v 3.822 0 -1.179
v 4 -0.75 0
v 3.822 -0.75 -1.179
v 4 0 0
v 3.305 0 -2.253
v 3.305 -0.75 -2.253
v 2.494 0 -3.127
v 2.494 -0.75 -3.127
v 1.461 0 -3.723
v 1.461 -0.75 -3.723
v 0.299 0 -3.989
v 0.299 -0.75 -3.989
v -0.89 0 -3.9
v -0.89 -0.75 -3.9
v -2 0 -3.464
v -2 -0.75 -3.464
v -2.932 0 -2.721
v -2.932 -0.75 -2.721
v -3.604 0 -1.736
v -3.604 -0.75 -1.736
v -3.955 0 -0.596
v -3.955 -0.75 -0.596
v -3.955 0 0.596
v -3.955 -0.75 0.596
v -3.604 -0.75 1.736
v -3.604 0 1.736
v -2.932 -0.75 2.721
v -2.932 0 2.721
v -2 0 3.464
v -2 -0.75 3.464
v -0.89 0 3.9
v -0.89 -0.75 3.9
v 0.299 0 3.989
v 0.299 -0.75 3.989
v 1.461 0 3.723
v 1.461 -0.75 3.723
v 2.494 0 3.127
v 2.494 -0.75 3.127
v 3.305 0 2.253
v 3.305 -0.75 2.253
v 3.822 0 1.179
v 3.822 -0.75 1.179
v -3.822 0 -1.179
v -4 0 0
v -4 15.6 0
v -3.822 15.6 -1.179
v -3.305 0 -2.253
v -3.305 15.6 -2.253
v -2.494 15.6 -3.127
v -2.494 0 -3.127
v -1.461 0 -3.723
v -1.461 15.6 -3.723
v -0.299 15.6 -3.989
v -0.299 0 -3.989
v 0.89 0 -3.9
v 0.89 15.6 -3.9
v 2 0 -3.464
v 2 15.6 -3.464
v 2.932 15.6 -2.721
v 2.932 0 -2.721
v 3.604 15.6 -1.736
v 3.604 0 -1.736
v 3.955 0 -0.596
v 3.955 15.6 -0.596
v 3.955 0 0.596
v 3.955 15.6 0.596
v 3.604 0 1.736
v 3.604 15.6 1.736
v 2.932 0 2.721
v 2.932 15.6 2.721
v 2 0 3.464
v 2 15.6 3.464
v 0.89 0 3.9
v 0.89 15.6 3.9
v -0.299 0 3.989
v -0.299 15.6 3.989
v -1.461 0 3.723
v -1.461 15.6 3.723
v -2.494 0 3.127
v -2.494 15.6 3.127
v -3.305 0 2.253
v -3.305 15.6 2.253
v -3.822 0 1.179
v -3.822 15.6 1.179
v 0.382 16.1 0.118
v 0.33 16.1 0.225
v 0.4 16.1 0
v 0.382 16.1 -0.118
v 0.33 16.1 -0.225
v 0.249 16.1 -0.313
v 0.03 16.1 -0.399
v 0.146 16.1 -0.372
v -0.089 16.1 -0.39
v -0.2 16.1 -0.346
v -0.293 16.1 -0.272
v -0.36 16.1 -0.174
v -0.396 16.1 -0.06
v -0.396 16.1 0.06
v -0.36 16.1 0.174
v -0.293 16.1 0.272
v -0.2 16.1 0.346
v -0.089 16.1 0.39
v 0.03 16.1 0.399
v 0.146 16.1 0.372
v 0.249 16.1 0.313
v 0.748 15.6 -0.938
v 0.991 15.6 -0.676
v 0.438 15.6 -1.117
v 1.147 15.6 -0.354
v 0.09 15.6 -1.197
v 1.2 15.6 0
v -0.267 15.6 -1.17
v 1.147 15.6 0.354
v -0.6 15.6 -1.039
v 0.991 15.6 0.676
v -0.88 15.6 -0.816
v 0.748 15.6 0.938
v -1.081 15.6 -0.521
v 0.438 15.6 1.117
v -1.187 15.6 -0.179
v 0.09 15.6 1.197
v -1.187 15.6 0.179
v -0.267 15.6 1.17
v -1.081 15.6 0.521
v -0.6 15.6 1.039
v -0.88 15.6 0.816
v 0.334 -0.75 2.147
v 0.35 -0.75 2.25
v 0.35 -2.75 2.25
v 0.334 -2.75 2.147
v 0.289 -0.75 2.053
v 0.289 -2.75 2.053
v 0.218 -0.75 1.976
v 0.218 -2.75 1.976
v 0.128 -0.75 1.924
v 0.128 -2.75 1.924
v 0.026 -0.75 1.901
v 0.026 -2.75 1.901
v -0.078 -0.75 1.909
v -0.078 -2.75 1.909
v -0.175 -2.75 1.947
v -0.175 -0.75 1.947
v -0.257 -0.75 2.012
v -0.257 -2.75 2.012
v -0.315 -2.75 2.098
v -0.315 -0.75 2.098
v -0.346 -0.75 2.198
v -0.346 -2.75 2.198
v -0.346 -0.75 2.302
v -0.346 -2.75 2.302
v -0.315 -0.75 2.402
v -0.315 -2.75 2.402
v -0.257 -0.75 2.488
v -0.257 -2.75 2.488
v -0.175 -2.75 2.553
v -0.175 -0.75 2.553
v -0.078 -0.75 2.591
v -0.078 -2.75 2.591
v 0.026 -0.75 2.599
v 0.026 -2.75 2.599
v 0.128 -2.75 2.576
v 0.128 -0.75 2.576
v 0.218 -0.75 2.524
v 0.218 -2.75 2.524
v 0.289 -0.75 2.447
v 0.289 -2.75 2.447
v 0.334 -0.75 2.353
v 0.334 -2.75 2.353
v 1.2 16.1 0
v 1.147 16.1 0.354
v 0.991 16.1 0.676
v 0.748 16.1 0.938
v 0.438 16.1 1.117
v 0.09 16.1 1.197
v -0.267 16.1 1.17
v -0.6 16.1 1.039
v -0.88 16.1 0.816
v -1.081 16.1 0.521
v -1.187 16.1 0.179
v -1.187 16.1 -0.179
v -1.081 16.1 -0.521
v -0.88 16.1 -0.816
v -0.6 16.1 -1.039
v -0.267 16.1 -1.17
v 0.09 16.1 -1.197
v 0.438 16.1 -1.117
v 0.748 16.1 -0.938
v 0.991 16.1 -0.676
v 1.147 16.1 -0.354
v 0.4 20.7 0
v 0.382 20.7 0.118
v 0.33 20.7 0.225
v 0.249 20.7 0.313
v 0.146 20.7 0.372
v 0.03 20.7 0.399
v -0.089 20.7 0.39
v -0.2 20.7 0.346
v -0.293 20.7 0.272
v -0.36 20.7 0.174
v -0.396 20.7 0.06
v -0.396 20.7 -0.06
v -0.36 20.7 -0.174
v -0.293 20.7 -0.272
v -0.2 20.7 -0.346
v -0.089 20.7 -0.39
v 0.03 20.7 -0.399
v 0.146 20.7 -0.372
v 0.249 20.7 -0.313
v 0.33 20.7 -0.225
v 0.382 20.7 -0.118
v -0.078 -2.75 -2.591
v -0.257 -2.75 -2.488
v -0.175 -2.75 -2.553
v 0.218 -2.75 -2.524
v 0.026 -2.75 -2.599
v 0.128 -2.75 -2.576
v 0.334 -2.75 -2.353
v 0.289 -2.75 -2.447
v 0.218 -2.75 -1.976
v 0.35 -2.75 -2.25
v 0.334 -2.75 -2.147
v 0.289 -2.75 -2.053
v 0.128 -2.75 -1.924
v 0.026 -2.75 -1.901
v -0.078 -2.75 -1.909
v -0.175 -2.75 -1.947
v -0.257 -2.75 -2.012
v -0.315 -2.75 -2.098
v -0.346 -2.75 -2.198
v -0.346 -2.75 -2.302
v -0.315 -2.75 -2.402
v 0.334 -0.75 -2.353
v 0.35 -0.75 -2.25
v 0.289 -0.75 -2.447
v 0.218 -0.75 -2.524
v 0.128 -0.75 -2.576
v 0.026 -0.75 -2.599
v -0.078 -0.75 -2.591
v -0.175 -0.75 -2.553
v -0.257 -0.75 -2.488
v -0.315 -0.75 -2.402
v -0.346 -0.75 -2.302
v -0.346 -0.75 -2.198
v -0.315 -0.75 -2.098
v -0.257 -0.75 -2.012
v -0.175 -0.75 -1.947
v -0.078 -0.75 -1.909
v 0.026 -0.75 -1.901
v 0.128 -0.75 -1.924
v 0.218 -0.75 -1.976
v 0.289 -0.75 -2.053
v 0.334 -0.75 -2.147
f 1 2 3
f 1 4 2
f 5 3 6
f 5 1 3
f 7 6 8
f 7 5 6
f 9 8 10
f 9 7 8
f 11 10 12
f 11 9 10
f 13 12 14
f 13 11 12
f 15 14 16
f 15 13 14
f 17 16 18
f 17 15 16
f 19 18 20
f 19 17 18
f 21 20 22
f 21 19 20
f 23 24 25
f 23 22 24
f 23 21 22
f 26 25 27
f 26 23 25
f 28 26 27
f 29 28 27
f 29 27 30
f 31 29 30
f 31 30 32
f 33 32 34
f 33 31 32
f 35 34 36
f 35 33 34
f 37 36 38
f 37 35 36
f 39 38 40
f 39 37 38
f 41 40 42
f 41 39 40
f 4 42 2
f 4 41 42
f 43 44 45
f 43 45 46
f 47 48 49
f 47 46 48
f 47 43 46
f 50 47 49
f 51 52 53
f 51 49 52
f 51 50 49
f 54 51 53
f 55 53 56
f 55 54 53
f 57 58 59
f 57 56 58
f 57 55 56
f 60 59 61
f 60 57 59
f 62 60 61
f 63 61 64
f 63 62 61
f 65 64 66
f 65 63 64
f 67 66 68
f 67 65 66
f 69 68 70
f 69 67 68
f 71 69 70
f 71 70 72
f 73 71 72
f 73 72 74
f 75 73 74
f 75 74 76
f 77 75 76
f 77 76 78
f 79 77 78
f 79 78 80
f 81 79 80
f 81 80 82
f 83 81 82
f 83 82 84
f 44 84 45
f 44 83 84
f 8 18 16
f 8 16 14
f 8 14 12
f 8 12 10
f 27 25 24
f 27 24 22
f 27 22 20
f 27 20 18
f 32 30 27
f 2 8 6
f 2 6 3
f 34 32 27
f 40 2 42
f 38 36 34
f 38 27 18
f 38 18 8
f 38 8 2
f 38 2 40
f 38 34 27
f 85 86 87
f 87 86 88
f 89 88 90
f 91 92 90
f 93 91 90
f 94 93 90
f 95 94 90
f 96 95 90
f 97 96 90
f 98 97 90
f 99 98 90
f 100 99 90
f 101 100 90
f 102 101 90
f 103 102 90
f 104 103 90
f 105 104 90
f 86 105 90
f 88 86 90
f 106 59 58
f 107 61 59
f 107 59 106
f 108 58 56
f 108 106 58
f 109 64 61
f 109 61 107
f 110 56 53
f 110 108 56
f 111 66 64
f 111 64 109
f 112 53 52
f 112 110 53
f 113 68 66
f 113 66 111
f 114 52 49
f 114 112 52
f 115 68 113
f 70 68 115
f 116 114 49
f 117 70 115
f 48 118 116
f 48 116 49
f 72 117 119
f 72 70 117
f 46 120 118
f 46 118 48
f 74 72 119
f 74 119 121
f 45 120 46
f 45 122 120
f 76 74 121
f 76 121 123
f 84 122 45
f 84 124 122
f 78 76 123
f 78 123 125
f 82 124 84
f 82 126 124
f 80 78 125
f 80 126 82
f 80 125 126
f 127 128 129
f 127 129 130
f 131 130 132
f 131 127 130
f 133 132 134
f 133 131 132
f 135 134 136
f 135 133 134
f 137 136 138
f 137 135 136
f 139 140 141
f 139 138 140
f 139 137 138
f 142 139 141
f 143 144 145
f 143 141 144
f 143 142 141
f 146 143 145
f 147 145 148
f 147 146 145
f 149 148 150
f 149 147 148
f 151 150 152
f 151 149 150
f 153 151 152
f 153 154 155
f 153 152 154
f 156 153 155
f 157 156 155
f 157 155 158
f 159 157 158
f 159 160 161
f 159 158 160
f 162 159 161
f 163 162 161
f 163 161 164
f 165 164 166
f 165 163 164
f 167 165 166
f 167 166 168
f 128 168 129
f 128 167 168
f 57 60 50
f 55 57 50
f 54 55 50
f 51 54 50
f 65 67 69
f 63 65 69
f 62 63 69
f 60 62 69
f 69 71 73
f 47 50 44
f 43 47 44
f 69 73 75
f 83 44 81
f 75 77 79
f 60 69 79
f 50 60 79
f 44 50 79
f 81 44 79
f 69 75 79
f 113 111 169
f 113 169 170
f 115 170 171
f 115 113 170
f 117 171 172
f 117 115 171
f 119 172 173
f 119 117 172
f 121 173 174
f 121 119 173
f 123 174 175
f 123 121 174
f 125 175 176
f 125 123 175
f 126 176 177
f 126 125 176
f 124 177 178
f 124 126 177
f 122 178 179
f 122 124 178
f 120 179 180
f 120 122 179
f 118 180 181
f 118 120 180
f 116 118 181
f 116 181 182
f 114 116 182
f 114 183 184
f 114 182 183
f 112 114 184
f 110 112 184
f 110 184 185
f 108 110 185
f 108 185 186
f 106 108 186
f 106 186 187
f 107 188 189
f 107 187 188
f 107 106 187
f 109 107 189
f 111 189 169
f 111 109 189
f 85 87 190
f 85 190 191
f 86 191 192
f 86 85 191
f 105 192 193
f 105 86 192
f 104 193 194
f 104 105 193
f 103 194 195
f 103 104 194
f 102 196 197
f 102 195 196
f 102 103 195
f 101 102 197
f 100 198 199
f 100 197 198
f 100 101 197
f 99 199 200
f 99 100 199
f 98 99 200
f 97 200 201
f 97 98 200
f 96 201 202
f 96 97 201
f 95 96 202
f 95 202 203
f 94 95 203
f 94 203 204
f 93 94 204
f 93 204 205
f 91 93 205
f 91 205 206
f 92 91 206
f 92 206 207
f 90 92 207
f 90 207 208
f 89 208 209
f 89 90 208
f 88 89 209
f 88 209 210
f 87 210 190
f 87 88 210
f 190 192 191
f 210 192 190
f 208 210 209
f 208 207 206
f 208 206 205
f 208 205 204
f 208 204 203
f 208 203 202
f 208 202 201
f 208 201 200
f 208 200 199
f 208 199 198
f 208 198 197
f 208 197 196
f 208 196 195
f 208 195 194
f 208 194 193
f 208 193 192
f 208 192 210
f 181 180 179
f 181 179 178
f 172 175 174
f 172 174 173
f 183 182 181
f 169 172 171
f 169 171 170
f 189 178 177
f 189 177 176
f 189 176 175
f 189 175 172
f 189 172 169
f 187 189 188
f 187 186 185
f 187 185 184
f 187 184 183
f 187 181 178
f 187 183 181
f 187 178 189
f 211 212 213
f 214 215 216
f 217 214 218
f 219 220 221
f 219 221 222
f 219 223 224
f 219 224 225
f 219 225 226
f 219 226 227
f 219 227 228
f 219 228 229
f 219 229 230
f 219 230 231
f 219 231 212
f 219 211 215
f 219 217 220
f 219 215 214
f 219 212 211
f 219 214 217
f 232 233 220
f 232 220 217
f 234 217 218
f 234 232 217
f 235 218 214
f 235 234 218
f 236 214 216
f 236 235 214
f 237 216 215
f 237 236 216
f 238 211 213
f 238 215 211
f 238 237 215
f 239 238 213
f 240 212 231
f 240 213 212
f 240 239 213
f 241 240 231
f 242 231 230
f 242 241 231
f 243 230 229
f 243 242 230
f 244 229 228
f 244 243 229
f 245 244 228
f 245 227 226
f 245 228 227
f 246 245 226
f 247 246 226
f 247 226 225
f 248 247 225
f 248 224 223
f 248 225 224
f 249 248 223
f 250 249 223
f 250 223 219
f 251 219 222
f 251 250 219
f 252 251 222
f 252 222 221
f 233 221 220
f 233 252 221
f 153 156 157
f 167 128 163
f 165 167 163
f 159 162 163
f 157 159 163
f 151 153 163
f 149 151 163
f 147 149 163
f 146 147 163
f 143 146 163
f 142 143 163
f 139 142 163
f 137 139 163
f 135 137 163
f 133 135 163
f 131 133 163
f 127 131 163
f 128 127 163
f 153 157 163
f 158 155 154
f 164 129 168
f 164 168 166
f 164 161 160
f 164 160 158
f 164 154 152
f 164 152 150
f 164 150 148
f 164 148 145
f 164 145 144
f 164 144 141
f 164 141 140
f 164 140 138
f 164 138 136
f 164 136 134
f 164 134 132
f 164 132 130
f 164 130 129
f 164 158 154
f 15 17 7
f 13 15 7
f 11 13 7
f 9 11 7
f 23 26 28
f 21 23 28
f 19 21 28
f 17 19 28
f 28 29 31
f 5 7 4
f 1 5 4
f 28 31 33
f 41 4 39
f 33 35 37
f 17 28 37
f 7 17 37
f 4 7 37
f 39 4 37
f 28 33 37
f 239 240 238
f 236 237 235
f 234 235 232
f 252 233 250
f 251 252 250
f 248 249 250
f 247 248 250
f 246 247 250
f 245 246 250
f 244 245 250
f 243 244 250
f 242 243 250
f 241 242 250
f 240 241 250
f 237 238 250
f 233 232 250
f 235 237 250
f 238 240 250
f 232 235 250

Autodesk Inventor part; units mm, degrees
ref_plane "YZ Plane" through (0, 0, 0) normal (1, 0, 0) x (0, 1, 0)
ref_plane "XZ Plane" through (0, 0, 0) normal (0, 1, 0) x (-1, 0, 0)
ref_plane "XY Plane" through (0, 0, 0) normal (0, 0, 1) x (1, 0, 0)
sketch "Sketch1" plane through (0, 0, 0) normal (0, 1, 0) x (-1, 0, 0)
  circle A0 centre (0, 0) radius 4
  dimension "d0" = 8
extrude "Extrusion1" add sketch "Sketch1" along normal blind 15.6
sketch "Sketch2" plane through (0, 15.6, 0) normal (0, 1, 0) x (1, 0, 0)
  circle A0 centre (0, 0) radius 4 projected
  circle A1 centre (0, 0) radius 1.2
  dimension "d3" = 2.4
extrude "Extrusion2" add sketch "Sketch2" along normal blind 0.5 contours A1
sketch "Sketch3" plane through (0, 0, 0) normal (0, -1, 0) x (1, 0, 0)
  circle A0 centre (0, 0) radius 1.2 projected
  circle A1 centre (0, 0) radius 4
extrude "Extrusion3" add sketch "Sketch3" along normal blind 0.75 separate body contours A0 | A1
sketch "Sketch4" plane through (0, 16.1, 0) normal (0, 1, 0) x (1, 0, 0)
  circle A0 centre (0, 0) radius 0.4
  dimension "d8" = 0.8
extrude "Extrusion4" add sketch "Sketch4" along normal blind 4.6 separate body
sketch "Sketch5" plane through (0, -0.75, 0) normal (0, -1, 0) x (1, 0, 0)
  circle A0 centre (0, 2.25) radius 0.35
  circle A1 centre (0, -2.25) radius 0.35
  line L0 (0, 0) -> (2.0359, 0)
  dimension "d11" = 0.7
  dimension "d12" = 0.7
  dimension "d13" = 4.5
extrude "Extrusion5" add sketch "Sketch5" along normal blind 2 separate body contours A1
extrude "Extrusion6" add sketch "Sketch5" along normal blind 2 separate body contours A0
properties part number "motor_noname"
